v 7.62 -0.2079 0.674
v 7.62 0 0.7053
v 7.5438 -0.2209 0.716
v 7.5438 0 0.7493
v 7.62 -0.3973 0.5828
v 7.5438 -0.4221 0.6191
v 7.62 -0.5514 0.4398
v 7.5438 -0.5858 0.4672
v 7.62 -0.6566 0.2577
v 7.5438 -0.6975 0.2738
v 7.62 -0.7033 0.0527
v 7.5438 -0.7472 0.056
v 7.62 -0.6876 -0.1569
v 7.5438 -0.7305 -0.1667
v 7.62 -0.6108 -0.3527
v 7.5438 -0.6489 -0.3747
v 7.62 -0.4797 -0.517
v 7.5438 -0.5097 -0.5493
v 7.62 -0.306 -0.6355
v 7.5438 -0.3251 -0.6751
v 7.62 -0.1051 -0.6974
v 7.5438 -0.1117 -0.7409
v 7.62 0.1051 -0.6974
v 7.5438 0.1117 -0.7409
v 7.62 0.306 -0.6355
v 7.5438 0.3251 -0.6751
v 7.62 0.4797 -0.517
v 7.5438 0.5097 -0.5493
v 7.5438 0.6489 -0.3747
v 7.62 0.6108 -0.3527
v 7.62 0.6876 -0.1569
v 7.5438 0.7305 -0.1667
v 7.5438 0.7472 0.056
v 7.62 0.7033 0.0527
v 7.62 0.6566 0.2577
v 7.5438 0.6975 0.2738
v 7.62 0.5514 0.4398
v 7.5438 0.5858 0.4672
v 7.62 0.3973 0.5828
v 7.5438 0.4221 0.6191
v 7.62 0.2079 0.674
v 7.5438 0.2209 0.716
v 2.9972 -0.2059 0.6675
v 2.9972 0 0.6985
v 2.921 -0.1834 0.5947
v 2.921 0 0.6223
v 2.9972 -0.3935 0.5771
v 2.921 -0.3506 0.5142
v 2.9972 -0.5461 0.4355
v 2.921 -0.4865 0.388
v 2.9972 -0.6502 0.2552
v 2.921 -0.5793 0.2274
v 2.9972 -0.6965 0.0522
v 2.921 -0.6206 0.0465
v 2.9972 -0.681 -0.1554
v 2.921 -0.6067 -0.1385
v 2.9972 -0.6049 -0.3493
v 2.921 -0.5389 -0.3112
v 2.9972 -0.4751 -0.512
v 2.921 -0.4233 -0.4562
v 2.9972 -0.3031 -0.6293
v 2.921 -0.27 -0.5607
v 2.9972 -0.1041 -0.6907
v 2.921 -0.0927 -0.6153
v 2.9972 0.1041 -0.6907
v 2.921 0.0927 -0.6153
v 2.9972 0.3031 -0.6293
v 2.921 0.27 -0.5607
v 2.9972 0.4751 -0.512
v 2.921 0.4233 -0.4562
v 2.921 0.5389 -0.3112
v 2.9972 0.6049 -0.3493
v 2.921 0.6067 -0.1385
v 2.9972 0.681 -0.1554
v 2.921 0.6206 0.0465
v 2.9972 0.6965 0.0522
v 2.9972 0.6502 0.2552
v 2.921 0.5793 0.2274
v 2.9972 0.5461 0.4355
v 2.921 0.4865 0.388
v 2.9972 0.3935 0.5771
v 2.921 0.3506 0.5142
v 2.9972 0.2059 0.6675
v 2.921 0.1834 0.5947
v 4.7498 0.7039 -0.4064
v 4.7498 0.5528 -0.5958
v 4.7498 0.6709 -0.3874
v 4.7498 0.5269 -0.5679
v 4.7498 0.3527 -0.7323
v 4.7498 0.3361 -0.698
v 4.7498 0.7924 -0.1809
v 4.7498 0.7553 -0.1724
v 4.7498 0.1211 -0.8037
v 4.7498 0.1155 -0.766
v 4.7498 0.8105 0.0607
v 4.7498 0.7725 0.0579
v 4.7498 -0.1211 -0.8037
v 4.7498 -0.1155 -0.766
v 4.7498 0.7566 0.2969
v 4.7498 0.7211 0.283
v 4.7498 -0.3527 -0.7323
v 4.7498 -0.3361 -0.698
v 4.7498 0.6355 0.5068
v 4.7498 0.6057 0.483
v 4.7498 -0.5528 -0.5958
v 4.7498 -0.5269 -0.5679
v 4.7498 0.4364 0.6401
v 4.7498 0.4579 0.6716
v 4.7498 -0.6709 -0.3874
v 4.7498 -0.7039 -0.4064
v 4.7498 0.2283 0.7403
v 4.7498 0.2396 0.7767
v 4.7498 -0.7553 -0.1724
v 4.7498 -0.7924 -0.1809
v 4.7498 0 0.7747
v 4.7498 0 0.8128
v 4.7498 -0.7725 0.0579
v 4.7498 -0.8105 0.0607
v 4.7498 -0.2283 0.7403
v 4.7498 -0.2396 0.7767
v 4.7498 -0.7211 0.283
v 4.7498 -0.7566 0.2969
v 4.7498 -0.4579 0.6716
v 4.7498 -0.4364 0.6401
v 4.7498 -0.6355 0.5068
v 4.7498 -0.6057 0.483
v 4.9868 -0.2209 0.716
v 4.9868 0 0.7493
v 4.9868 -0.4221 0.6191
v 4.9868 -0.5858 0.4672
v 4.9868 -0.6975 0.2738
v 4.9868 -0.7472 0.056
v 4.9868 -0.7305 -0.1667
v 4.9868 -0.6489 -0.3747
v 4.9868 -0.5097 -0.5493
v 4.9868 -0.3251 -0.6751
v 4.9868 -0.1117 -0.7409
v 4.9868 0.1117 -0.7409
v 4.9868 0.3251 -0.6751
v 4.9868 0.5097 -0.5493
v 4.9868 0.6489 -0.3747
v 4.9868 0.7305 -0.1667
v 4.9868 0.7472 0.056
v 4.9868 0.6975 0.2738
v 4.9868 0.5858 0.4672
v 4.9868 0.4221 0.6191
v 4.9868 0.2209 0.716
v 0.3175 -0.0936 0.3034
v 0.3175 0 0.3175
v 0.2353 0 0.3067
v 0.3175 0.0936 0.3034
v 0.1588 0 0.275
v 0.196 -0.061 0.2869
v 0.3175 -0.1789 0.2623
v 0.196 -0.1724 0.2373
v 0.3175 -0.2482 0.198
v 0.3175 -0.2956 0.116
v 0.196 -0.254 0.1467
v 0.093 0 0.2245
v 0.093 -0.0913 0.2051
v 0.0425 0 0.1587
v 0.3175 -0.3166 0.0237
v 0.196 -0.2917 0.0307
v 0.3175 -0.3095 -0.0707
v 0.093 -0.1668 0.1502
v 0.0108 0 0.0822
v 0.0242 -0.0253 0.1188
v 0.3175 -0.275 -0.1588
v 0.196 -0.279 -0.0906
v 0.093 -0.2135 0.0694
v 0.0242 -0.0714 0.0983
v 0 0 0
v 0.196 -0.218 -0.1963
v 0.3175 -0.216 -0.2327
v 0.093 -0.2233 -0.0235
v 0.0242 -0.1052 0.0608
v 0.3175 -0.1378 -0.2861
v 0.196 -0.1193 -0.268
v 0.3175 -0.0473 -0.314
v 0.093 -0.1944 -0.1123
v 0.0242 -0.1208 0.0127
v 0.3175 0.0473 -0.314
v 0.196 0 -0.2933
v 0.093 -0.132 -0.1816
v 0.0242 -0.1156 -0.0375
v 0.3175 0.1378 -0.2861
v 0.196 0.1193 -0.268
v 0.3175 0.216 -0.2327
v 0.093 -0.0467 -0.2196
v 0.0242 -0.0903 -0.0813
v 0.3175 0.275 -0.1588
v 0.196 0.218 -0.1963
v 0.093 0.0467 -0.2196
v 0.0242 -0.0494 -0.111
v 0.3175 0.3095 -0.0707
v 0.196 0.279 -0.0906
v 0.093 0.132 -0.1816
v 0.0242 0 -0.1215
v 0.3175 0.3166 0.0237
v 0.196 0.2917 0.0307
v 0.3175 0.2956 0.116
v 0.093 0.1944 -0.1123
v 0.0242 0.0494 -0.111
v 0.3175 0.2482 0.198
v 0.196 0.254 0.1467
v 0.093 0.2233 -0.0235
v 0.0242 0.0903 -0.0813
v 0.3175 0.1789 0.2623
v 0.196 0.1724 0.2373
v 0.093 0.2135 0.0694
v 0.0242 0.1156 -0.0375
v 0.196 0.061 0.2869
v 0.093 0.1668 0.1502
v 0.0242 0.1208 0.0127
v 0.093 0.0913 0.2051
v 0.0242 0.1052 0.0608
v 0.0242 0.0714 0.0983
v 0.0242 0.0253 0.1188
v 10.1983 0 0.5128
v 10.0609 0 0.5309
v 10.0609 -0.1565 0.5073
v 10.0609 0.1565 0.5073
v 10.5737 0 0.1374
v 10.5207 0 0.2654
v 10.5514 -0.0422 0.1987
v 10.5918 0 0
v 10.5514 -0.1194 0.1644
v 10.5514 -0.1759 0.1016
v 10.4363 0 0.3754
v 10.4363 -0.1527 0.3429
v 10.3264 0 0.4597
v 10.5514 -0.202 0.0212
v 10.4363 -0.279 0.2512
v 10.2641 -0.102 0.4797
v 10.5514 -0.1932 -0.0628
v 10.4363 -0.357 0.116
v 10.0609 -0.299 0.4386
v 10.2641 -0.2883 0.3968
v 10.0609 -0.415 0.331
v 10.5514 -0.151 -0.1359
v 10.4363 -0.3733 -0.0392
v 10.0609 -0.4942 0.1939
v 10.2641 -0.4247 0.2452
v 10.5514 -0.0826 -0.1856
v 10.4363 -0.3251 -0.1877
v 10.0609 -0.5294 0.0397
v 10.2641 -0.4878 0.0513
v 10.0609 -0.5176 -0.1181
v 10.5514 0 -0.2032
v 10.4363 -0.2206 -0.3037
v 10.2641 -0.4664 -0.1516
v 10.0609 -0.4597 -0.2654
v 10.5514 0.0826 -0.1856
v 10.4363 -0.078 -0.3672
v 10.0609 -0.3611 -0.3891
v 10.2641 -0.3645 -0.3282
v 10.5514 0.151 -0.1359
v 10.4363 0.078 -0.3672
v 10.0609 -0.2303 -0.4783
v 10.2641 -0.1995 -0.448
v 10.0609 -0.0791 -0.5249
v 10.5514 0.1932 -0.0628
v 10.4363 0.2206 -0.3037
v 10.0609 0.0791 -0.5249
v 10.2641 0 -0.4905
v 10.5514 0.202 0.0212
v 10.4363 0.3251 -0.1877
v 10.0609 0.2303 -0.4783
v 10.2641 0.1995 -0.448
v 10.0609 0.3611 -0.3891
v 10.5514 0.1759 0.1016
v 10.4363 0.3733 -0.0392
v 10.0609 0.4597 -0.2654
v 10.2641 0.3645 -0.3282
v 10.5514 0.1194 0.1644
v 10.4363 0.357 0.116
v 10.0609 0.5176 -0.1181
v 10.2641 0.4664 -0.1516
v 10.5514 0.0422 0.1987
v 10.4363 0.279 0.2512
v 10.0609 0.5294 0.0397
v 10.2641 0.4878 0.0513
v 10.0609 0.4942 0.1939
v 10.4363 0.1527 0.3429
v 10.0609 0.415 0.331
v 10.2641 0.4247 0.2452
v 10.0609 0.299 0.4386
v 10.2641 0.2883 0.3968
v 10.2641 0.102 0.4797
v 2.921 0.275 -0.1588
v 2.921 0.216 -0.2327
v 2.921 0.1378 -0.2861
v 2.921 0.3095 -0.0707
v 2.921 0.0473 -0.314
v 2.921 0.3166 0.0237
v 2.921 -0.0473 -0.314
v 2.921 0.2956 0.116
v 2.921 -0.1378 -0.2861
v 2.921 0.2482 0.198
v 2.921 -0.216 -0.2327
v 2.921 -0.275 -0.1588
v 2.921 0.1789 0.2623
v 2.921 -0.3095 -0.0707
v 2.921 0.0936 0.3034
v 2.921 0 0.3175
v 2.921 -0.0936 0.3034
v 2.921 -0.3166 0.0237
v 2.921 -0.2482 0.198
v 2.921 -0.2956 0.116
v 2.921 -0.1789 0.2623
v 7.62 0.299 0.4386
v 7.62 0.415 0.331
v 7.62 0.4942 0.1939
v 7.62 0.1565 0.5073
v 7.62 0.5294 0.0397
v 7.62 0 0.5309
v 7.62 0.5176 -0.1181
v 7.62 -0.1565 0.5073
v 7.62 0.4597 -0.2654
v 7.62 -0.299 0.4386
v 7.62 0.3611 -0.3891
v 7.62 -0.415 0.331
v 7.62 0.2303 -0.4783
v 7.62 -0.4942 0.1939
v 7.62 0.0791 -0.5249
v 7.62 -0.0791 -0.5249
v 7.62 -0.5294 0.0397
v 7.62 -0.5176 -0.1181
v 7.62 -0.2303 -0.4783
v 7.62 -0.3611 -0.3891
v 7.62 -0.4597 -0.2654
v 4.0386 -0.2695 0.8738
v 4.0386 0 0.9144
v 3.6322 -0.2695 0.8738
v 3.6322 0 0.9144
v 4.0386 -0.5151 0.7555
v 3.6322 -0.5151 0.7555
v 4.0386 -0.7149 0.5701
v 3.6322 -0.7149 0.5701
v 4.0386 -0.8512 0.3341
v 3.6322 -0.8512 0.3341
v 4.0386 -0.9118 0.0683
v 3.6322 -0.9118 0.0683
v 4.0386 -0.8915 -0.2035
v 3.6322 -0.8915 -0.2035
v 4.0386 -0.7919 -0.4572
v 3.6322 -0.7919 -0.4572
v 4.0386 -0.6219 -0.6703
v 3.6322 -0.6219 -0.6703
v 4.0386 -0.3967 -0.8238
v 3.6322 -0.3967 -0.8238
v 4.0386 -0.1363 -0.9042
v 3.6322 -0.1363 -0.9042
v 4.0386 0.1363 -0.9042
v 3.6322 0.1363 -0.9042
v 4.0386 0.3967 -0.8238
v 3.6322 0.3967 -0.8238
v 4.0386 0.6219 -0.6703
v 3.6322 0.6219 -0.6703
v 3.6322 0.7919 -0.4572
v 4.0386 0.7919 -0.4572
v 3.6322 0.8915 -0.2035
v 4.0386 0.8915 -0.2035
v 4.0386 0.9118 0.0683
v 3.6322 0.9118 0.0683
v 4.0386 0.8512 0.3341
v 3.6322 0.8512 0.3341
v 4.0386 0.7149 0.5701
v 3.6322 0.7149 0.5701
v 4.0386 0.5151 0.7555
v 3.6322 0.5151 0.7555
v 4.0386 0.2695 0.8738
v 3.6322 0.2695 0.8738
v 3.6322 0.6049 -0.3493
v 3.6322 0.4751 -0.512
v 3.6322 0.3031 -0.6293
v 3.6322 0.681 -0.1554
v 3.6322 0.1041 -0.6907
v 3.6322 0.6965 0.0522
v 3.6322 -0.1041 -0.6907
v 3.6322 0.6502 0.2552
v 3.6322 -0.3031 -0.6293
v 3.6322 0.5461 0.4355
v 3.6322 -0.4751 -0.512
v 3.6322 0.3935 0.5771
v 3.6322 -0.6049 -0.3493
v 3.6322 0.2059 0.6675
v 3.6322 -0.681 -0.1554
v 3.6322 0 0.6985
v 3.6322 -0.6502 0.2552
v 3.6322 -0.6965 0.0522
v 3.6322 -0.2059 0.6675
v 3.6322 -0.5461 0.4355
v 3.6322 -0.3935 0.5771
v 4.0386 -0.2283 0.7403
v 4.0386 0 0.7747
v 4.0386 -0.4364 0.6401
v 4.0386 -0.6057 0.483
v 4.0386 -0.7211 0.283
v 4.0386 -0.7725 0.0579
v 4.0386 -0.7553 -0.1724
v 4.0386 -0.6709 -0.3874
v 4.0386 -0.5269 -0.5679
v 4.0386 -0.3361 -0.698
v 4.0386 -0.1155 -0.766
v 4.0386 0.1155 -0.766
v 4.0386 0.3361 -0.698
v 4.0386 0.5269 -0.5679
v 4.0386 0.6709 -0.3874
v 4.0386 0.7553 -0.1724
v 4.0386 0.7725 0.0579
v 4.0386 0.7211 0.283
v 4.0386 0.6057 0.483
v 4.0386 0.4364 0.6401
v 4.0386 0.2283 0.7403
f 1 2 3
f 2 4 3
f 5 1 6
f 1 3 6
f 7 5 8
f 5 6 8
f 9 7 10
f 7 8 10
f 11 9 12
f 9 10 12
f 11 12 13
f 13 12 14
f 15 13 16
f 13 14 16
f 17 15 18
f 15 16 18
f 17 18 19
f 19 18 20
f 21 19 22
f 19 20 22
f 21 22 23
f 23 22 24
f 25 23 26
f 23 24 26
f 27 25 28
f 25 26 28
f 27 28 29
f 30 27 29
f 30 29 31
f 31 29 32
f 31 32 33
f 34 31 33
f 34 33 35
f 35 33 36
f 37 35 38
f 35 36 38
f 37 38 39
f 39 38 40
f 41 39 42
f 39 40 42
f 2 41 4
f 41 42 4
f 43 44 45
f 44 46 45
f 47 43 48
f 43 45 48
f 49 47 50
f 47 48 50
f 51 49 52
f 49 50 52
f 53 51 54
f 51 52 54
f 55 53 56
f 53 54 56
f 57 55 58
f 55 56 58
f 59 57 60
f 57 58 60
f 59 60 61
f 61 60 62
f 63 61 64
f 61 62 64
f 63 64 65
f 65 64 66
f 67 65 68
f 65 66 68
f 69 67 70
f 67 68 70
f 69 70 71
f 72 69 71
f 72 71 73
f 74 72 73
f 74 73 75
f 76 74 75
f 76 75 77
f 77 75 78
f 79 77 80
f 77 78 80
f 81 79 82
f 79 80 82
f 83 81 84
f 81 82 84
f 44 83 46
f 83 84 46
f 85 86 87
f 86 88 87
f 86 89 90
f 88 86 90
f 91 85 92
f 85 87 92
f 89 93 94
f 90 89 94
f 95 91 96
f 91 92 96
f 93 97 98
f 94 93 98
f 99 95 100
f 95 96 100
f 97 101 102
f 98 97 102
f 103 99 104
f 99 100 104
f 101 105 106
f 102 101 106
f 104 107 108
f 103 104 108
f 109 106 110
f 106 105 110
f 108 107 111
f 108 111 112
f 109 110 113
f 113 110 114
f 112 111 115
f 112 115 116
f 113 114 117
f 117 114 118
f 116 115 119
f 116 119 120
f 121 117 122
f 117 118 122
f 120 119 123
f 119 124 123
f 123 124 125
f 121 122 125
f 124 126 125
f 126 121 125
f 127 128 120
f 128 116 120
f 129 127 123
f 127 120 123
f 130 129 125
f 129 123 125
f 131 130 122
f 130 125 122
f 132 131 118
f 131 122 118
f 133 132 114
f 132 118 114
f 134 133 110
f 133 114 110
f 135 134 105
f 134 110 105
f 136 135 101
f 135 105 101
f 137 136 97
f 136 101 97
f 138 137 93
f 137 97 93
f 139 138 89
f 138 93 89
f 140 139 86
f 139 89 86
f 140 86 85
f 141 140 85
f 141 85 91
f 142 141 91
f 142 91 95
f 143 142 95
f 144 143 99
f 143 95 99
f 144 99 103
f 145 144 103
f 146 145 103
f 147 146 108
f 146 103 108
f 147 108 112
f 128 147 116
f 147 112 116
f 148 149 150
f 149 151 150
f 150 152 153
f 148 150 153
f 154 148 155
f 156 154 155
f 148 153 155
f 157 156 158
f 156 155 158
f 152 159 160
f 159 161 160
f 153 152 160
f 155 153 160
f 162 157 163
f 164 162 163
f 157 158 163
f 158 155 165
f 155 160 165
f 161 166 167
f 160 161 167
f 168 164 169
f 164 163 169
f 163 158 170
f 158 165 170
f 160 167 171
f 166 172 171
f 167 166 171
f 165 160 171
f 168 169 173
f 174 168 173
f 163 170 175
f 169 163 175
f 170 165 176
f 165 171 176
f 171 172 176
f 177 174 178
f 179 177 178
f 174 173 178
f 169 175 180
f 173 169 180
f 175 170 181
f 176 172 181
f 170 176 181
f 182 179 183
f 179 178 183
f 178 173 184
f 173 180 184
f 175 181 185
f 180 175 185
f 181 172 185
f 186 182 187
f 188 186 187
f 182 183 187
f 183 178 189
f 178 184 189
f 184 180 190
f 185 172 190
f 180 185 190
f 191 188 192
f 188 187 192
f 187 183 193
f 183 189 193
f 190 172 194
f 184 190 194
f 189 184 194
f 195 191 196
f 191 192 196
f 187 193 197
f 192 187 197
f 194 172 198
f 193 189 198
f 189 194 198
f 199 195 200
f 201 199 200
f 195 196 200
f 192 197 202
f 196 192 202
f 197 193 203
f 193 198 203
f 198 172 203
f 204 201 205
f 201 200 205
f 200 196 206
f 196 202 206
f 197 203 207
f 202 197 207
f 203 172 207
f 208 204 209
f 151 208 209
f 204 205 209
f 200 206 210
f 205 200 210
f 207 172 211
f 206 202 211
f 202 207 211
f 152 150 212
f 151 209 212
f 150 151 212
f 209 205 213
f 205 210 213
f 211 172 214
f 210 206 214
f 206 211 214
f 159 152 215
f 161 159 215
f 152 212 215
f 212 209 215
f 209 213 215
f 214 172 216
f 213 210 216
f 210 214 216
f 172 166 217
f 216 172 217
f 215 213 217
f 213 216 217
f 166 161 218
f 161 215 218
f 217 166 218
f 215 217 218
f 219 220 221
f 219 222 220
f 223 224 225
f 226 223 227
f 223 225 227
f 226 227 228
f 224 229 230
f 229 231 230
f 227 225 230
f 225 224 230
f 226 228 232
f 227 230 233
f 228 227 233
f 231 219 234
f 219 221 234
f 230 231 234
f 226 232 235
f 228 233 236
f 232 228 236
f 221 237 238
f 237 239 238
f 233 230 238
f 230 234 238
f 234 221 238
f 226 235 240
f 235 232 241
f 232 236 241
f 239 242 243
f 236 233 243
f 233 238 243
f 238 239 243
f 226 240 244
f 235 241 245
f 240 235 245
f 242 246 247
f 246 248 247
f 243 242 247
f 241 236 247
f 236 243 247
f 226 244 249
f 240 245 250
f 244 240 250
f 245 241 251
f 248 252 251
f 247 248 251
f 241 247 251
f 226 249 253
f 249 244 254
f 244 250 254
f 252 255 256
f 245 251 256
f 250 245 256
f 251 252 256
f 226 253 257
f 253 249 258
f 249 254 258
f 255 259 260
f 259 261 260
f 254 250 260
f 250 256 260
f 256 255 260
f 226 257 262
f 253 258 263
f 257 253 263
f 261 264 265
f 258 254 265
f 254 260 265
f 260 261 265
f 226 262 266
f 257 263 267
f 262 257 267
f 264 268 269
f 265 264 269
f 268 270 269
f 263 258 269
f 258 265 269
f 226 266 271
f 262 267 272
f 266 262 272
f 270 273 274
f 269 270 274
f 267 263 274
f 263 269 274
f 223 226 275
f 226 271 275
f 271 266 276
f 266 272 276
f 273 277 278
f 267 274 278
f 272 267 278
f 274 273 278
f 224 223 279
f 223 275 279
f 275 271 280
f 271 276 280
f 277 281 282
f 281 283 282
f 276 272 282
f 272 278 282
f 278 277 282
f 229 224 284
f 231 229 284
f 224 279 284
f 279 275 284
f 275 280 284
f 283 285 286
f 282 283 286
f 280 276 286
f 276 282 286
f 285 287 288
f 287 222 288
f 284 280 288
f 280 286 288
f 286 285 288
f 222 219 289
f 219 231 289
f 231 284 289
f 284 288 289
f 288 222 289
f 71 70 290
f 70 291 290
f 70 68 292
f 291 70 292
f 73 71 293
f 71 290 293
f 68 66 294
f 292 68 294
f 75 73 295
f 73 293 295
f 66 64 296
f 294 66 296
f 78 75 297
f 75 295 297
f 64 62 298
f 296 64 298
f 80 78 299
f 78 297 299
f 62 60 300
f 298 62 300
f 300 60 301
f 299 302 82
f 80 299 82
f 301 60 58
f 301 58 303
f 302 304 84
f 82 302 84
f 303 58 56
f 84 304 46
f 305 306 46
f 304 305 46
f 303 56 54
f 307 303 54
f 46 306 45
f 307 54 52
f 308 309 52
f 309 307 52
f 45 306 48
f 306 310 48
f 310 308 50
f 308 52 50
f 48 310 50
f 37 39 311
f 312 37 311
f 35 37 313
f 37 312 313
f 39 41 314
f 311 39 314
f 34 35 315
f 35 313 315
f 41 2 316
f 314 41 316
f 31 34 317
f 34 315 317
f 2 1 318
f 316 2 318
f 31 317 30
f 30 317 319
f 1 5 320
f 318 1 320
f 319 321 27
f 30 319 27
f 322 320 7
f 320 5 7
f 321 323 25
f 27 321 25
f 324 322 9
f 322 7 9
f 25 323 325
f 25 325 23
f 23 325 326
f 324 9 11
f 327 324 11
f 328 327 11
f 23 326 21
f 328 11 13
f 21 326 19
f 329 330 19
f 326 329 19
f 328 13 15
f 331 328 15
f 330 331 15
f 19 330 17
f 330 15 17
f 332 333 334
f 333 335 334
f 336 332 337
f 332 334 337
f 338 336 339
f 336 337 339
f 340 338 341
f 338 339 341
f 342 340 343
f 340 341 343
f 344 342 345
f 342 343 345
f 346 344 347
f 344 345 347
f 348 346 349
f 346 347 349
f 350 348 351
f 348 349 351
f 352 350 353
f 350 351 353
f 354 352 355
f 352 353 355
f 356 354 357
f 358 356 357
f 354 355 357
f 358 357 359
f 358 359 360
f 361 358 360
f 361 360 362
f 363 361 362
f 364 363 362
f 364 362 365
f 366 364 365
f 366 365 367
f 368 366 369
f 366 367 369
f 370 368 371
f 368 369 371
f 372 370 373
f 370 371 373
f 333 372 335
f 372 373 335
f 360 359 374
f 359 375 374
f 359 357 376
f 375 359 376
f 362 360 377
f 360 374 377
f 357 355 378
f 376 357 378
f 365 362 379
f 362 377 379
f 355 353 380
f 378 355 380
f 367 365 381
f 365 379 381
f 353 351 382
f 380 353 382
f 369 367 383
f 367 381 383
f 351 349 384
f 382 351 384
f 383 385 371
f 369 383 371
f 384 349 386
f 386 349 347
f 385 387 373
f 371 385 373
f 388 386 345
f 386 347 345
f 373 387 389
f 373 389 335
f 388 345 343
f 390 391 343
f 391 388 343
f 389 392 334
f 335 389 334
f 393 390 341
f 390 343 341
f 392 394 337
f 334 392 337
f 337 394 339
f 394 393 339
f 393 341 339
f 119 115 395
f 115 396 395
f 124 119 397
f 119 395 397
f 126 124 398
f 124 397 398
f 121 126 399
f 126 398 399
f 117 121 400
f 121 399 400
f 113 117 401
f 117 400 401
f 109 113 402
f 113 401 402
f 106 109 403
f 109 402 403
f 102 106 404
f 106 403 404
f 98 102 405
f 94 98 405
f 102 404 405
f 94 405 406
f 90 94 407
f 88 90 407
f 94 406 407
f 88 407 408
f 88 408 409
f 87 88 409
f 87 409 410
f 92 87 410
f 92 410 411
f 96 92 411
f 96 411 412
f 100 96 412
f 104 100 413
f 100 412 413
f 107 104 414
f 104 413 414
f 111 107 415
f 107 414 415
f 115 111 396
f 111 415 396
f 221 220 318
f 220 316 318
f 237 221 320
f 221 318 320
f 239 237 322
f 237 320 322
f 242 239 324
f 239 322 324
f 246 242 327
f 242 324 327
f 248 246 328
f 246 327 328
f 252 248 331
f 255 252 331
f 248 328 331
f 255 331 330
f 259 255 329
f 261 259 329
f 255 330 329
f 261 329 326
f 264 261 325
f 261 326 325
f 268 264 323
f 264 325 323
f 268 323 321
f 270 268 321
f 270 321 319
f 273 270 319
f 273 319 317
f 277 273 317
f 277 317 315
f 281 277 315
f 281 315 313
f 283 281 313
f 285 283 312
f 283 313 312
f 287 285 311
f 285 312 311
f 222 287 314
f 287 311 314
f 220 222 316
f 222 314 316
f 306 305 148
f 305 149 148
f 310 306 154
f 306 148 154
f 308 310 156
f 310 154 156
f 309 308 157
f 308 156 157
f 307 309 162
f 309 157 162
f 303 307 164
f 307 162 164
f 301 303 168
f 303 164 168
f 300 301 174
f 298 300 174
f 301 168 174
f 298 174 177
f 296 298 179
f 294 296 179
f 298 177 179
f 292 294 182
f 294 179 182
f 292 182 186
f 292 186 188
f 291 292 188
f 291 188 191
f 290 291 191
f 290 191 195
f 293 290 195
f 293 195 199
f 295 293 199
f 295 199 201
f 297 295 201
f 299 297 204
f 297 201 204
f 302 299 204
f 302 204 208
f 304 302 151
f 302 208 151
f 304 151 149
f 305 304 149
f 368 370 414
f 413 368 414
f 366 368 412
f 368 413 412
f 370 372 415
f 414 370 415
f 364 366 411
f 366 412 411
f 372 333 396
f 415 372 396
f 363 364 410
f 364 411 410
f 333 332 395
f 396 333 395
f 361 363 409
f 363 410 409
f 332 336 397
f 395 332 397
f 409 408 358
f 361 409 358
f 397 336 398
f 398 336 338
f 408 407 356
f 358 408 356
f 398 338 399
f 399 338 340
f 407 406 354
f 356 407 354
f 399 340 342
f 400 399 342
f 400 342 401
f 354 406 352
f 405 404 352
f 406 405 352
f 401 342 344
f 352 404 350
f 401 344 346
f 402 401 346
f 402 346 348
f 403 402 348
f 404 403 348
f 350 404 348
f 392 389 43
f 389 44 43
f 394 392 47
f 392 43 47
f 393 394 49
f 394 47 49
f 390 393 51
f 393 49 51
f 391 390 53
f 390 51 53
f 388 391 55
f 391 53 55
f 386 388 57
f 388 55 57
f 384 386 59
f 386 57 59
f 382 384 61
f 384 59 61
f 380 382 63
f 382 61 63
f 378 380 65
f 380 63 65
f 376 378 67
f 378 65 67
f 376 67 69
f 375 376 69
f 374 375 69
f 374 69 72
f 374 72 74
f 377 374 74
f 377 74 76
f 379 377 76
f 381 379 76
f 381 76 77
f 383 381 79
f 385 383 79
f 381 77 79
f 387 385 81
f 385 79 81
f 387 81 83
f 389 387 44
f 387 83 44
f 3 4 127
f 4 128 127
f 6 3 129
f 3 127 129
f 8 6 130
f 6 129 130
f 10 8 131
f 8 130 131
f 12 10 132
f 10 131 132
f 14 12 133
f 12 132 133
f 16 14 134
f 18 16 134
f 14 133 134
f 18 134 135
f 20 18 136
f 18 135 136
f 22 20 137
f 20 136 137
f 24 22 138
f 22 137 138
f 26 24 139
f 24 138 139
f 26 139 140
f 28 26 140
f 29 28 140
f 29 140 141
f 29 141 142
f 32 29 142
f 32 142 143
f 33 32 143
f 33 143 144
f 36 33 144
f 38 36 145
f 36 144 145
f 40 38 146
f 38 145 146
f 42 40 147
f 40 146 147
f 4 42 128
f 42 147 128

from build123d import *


with BuildPart() as part:
    # Sketch1 → Revolve1 (revolve)
    with BuildSketch(Plane.XY, mode=Mode.PRIVATE) as revolve1_sk:
        with BuildLine():
            Line((0, 0), (10.5918, 0))
            ThreePointArc((10.5918, 0), (10.436314706, 0.375374706), (10.06094, 0.53086))
            Line((10.06094, 0.53086), (7.62, 0.53086))
            Line((7.62, 0.53086), (7.62, 0.705305909))
            Line((7.62, 0.705305909), (7.5438, 0.7493))
            Line((7.5438, 0.7493), (4.986785226, 0.7493))
            Line((4.986785226, 0.7493), (4.7498, 0.8128))
            Line((4.7498, 0.8128), (4.7498, 0.7747))
            Line((4.7498, 0.7747), (4.0386, 0.7747))
            Line((4.0386, 0.7747), (4.0386, 0.9144))
            Line((4.0386, 0.9144), (3.6322, 0.9144))
            Line((3.6322, 0.9144), (3.6322, 0.6985))
            Line((3.6322, 0.6985), (2.9972, 0.6985))
            Line((2.9972, 0.6985), (2.921, 0.6223))
            Line((2.921, 0.6223), (2.921, 0.3175))
            Line((2.921, 0.3175), (0.3175, 0.3175))
            ThreePointArc((0.3175, 0.3175), (0.092993597, 0.224506403), (0, 0))
        make_face()
    revolve(revolve1_sk.sketch.rotate(Axis((0, 0, 0), (1, 0, 0)), 90), axis=Axis((0, 0, 0), (1, 0, 0)))


solid = part.part
